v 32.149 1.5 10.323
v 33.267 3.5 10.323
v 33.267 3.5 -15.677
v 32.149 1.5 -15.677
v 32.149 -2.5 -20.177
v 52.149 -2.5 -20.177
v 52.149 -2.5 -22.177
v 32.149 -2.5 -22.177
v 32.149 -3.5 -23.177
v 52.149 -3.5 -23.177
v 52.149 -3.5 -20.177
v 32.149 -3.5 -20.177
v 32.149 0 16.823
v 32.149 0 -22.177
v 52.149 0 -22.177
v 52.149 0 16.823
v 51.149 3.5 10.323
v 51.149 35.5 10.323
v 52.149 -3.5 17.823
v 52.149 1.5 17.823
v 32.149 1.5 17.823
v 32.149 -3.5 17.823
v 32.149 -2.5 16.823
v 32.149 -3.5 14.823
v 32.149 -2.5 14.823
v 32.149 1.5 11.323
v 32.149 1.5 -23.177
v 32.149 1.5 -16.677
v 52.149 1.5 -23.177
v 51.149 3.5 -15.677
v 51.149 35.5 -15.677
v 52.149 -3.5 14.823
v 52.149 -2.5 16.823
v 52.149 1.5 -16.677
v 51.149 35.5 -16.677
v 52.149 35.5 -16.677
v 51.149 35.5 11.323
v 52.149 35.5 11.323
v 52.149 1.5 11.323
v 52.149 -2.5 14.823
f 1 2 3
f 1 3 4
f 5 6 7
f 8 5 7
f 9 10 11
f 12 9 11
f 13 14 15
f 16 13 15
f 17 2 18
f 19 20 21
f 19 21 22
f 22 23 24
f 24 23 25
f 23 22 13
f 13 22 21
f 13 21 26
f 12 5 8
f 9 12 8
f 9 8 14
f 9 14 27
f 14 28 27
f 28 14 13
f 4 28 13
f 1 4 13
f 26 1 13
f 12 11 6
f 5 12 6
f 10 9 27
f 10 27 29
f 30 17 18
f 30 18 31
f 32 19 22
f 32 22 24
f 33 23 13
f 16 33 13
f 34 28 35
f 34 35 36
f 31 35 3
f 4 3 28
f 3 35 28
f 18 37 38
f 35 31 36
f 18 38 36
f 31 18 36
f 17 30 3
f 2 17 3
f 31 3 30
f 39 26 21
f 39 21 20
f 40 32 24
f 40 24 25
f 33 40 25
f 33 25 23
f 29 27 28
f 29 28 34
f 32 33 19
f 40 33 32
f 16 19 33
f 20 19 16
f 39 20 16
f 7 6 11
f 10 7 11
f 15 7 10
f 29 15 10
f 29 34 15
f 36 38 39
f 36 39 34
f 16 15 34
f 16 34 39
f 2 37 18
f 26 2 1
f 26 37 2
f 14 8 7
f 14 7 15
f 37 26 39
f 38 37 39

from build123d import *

# Parameters (mm, degrees)
CROQUIS1_W              = 20
CROQUIS1_H              = 41
SALIENTE_EXTRUIR1_DEPTH = 1.5
SALIENTE_EXTRUIR3_DEPTH = 20
CROQUIS4_W              = 28
CROQUIS4_H              = 34
SALIENTE_EXTRUIR4_DEPTH = 1
SALIENTE_EXTRUIR5_DEPTH = 1
SALIENTE_EXTRUIR6_DEPTH = 1
SALIENTE_EXTRUIR7_DEPTH = 28


with BuildPart() as part:
    # Croquis1 → Saliente-Extruir1 (new body)
    with BuildSketch(Plane(origin=(0, 0, 0), x_dir=(1, 0, 0), z_dir=(0, 1, 0))):
        with Locations((42.14893617, 2.677304965)):
            Rectangle(CROQUIS1_W, CROQUIS1_H)
    extrude(amount=SALIENTE_EXTRUIR1_DEPTH)

    # Croquis3 → Saliente-Extruir3 (add)
    with BuildSketch(Plane(origin=(52.14893617, 0, 0), x_dir=(0, 0, -1), z_dir=(1, 0, 0))):
        Polygon((-17.822695035, 0), (-17.822695035, -3.5), (-14.822695035, -3.5), (-14.822695035, -2.5), (-16.822695035, -2.5), (-16.822695035, 0), align=None)
        Polygon((22.177304965, -2.5), (22.177304965, 0), (23.177304965, 0), (23.177304965, -3.5), (20.177304965, -3.5), (20.177304965, -2.5), align=None)
    extrude(amount=-SALIENTE_EXTRUIR3_DEPTH)

    # Croquis4 → Saliente-Extruir4 (add)
    with BuildSketch(Plane(origin=(52.14893617, 0, 0), x_dir=(0, 0, -1), z_dir=(1, 0, 0))):
        with Locations((2.677304965, 18.5)):
            Rectangle(CROQUIS4_W, CROQUIS4_H)
    extrude(amount=-SALIENTE_EXTRUIR4_DEPTH)

    # Croquis5 → Saliente-Extruir5 (add)
    with BuildSketch(Plane.XY.offset(11.322695035)):
        Polygon((51.14893617, 35.5), (32.14893617, 1.5), (51.14893617, 1.5), align=None)
    extrude(amount=-SALIENTE_EXTRUIR5_DEPTH)

    # Croquis6 → Saliente-Extruir6 (add)
    with BuildSketch(Plane(origin=(0, 0, -16.677304965), x_dir=(-1, 0, 0), z_dir=(0, 0, -1))):
        Polygon((-51.14893617, 35.5), (-32.14893617, 1.5), (-51.14893617, 1.5), align=None)
    extrude(amount=-SALIENTE_EXTRUIR6_DEPTH)

    # Croquis7 → Saliente-Extruir7 (add)
    with BuildSketch(Plane.XY.offset(11.322695035)):
        Polygon((52.14893617, 1.5), (52.14893617, 3.5), (33.266583229, 3.5), (32.14893617, 1.5), align=None)
    extrude(amount=-SALIENTE_EXTRUIR7_DEPTH)


solid = part.part
